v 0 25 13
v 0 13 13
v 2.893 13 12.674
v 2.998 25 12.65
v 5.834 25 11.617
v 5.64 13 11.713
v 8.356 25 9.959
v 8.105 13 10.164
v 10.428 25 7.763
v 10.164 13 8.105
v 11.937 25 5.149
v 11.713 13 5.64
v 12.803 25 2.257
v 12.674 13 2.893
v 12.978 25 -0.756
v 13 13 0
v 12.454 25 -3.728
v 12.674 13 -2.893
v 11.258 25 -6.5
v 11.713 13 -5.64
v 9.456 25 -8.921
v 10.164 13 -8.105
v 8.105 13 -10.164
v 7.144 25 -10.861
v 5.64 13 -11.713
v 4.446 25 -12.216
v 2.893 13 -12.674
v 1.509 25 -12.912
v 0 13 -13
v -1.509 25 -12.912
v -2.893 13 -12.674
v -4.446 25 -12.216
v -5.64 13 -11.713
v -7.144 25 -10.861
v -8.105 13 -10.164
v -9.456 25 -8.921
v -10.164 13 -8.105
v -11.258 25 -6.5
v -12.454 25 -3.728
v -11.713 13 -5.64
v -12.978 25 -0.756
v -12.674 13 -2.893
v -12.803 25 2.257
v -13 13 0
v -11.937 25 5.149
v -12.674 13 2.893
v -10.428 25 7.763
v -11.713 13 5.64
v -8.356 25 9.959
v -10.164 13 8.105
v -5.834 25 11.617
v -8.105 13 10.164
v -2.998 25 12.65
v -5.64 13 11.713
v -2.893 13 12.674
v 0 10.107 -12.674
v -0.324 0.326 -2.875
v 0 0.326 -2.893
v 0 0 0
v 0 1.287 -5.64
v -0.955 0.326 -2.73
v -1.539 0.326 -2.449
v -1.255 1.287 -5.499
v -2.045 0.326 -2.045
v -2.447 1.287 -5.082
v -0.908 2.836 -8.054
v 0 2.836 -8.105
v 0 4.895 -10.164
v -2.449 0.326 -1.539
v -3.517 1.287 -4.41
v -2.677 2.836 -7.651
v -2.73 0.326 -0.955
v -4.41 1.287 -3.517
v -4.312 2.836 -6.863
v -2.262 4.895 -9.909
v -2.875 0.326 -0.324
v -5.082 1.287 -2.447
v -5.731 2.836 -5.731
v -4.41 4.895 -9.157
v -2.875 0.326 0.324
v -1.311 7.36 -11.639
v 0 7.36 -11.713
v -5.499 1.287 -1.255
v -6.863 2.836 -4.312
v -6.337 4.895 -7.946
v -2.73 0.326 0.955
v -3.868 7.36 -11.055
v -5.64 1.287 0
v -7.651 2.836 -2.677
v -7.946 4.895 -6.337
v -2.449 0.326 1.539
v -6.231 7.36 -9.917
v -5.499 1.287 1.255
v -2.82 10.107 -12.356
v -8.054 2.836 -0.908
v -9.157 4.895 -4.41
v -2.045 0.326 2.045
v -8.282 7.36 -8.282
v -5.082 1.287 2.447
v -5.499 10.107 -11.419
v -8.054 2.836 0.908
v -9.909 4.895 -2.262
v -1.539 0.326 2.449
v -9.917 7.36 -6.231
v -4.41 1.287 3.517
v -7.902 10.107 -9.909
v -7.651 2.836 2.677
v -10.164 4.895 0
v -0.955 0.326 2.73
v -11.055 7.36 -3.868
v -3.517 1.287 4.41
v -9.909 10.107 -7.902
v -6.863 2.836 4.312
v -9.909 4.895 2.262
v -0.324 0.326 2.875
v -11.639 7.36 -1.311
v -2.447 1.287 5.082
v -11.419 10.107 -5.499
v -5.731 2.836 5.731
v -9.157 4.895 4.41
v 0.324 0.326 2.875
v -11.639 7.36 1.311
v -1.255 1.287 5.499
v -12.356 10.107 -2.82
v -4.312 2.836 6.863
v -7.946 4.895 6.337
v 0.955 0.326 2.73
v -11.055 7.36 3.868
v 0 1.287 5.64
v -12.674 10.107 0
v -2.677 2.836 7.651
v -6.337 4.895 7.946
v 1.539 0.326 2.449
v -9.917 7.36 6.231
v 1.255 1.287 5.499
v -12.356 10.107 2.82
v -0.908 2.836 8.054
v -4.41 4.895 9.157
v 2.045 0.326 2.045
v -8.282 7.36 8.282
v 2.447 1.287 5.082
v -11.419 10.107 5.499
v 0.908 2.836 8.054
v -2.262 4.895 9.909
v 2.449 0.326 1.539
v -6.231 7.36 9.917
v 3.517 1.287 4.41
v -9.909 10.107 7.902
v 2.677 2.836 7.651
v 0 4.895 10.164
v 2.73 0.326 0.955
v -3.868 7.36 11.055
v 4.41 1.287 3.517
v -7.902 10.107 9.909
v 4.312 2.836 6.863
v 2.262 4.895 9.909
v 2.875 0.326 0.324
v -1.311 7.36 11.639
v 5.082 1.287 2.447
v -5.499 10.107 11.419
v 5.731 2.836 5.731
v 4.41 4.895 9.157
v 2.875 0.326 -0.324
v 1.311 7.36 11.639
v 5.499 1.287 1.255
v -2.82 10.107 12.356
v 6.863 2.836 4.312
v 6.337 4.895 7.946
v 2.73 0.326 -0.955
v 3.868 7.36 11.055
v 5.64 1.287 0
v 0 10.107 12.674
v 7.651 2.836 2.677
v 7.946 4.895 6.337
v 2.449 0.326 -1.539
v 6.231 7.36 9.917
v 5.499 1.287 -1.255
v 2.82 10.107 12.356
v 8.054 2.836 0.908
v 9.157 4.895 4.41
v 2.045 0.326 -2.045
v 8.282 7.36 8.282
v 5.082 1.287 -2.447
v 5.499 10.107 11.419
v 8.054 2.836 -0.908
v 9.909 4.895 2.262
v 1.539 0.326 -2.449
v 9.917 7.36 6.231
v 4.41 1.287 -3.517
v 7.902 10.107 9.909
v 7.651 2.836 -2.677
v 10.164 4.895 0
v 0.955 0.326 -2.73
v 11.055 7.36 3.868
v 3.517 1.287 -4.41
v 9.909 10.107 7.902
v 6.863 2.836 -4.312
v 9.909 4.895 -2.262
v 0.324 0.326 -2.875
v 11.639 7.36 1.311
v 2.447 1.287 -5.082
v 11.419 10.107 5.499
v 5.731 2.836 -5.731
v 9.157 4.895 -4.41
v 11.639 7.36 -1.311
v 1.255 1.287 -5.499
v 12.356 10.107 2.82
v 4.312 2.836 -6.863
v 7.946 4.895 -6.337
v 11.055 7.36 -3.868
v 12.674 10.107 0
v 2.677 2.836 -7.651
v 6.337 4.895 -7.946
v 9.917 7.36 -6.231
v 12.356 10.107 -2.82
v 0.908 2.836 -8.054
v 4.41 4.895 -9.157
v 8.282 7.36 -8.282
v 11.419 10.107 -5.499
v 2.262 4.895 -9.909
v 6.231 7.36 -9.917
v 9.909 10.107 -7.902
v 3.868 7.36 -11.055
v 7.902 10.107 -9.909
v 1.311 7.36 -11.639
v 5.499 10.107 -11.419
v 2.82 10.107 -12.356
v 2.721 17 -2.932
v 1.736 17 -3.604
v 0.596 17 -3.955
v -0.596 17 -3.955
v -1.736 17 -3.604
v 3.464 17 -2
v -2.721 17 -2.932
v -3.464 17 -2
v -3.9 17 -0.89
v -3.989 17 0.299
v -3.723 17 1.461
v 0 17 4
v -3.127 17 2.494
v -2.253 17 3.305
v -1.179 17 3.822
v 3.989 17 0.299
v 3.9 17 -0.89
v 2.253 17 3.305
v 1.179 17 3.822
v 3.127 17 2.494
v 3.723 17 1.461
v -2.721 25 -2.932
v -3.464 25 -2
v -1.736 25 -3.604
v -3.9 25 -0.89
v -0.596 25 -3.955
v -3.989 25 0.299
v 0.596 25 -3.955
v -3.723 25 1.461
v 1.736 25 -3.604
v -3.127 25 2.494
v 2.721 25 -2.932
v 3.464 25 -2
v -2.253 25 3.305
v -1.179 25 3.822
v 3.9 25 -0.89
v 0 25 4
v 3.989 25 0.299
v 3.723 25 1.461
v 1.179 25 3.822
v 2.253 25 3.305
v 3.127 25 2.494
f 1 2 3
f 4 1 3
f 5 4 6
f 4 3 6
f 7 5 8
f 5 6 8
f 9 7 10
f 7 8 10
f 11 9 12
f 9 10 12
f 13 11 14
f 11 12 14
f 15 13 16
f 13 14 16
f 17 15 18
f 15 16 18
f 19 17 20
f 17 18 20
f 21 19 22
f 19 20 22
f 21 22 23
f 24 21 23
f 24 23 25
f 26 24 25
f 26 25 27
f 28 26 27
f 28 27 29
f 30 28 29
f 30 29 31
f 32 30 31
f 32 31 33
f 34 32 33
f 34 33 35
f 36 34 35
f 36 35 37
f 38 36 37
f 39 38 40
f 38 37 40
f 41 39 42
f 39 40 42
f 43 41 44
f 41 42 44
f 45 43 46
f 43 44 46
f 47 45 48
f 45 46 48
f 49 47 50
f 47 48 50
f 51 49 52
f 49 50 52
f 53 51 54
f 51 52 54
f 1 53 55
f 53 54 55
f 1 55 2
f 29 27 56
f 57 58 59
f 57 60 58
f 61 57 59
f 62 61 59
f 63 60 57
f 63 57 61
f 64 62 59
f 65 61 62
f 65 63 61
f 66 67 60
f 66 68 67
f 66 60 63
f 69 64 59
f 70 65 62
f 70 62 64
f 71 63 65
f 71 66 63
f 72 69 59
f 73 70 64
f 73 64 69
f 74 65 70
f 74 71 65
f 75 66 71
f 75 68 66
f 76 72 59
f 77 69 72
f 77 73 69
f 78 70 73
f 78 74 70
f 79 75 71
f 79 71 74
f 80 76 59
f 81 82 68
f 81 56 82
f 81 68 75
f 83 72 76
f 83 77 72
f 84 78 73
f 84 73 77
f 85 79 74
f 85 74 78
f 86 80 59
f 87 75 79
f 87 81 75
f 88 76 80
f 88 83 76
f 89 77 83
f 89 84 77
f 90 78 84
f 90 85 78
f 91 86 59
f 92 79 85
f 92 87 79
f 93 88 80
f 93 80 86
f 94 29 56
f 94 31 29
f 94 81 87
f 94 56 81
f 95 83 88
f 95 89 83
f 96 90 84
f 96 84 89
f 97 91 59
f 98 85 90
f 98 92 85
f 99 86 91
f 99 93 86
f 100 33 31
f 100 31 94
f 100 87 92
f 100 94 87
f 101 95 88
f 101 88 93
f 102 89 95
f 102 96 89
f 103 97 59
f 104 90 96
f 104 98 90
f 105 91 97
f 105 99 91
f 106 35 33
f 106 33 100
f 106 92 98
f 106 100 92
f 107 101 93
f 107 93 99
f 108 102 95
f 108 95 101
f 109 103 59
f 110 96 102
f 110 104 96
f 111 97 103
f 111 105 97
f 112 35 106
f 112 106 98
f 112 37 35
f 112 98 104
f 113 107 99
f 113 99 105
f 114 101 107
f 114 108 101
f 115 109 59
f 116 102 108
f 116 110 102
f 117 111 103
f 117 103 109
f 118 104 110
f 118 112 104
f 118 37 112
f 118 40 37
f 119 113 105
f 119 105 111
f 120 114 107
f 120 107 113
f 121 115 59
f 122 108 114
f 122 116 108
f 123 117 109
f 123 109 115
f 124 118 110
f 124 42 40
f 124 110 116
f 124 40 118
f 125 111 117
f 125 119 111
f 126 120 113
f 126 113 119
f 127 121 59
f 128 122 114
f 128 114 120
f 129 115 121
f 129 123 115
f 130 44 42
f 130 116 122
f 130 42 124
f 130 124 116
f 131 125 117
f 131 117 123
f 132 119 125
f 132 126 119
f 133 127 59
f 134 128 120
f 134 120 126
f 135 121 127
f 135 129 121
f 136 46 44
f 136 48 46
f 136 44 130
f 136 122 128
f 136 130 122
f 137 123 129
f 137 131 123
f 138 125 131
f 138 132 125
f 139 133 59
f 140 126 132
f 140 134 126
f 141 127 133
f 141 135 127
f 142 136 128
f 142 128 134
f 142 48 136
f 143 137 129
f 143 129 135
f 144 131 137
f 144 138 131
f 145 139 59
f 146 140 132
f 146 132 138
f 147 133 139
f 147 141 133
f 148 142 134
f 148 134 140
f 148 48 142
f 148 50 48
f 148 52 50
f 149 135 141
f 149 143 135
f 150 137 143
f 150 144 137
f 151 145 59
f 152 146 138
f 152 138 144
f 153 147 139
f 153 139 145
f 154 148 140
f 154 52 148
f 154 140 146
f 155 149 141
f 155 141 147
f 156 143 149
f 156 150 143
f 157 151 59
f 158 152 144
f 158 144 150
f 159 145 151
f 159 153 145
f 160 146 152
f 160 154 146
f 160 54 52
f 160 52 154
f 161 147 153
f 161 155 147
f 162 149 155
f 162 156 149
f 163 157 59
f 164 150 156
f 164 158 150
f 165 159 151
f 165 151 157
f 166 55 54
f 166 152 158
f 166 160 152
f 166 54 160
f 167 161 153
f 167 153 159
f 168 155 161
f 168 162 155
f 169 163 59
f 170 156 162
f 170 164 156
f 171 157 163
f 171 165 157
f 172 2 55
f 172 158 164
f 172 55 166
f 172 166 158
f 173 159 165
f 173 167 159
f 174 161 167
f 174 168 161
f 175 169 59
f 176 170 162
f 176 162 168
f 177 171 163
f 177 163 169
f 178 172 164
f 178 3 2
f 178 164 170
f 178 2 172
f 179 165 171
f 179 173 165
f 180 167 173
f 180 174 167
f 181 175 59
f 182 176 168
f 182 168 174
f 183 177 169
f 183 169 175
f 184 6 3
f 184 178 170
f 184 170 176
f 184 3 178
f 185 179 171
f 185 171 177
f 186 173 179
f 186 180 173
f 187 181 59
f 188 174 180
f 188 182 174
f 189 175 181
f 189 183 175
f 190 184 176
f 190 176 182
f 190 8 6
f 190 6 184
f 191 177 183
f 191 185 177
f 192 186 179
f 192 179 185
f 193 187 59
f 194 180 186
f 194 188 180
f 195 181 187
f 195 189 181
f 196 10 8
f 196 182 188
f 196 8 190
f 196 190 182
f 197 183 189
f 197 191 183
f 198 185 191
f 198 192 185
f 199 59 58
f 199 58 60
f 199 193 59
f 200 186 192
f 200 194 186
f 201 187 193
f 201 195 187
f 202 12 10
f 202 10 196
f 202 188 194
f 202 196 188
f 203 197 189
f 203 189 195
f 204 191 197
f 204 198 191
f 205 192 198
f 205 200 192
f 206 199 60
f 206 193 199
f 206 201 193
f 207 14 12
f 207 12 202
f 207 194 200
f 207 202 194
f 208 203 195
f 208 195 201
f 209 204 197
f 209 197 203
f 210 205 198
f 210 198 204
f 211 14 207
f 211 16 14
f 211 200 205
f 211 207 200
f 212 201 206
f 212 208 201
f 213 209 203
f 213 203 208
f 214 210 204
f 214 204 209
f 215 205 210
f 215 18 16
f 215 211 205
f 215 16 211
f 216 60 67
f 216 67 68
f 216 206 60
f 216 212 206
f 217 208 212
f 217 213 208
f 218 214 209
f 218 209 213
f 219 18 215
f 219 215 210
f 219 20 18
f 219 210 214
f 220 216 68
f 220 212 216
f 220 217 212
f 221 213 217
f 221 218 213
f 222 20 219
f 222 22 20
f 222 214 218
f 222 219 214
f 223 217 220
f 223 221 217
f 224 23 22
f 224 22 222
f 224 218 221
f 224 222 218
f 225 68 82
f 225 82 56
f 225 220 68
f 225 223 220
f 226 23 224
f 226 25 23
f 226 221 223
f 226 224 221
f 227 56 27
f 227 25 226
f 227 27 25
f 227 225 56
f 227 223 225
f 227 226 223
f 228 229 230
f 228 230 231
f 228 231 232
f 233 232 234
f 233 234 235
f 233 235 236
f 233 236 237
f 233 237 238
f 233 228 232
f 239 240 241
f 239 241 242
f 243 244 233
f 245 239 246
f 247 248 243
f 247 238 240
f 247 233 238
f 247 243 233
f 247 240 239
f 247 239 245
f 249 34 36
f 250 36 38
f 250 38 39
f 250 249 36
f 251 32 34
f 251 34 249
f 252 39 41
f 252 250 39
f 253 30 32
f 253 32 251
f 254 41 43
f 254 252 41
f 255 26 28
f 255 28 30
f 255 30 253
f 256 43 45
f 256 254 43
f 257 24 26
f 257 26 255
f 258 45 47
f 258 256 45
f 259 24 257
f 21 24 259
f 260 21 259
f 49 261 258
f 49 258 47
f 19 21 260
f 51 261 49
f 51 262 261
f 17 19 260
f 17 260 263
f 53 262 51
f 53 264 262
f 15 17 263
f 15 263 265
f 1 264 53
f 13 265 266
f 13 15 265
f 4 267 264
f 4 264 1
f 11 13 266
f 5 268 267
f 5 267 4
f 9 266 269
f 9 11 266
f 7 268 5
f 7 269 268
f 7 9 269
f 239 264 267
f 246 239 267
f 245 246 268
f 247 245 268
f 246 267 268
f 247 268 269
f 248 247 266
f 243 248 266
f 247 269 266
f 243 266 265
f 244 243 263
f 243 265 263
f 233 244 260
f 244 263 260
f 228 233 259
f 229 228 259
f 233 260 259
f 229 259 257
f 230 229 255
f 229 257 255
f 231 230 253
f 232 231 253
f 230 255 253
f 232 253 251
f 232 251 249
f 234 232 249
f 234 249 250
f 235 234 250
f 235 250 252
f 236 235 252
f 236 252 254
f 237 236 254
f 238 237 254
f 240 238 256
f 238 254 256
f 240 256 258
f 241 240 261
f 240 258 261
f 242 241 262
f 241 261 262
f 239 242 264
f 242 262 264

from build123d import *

# Parameters (mm, degrees)
SKETCH1_R           = 13
BOSS_EXTRUDE1_DEPTH = 25
SKETCH2_R           = 4
CUT_EXTRUDE1_DEPTH  = 8
SKETCH4_W           = 4.368412871
SKETCH4_H           = 18.958156908


with BuildPart() as part:
    # Sketch1 → Boss-Extrude1 (new body)
    with BuildSketch(Plane(origin=(0, 0, 0), x_dir=(1, 0, 0), z_dir=(0, 1, 0))):
        with Locations(Location((0, 0, 0), (0, 0, 270))):
            Circle(SKETCH1_R)
    extrude(amount=BOSS_EXTRUDE1_DEPTH)

    # Sketch2 → Cut-Extrude1 (cut)
    with BuildSketch(Plane(origin=(0, 25, 0), x_dir=(1, 0, 0), z_dir=(0, 1, 0))):
        with Locations(Location((0, 0, 0), (0, 0, 270))):
            Circle(SKETCH2_R)
    extrude(amount=-CUT_EXTRUDE1_DEPTH, mode=Mode.SUBTRACT)

    # Sketch4 → Cut-Revolve1 (revolve, cut)
    with BuildSketch(Plane.XY, mode=Mode.PRIVATE) as cut_revolve1_sk:
        with BuildLine():
            ThreePointArc((0, 0), (-9.192388155, 3.807611845), (-13, 13))
            Line((-13, 13), (-13, -5.958156908))
            Line((-13, -5.958156908), (0, -5.958156908))
            Line((0, -5.958156908), (0, 0))
        make_face()
        with Locations((-15.184206436, 3.520921546)):
            Rectangle(SKETCH4_W, SKETCH4_H)
    revolve(cut_revolve1_sk.sketch.rotate(Axis((0, -5.958156908, 0), (0, 1, 0)), 270), axis=Axis((0, -5.958156908, 0), (0, 1, 0)), mode=Mode.SUBTRACT)


solid = part.part
